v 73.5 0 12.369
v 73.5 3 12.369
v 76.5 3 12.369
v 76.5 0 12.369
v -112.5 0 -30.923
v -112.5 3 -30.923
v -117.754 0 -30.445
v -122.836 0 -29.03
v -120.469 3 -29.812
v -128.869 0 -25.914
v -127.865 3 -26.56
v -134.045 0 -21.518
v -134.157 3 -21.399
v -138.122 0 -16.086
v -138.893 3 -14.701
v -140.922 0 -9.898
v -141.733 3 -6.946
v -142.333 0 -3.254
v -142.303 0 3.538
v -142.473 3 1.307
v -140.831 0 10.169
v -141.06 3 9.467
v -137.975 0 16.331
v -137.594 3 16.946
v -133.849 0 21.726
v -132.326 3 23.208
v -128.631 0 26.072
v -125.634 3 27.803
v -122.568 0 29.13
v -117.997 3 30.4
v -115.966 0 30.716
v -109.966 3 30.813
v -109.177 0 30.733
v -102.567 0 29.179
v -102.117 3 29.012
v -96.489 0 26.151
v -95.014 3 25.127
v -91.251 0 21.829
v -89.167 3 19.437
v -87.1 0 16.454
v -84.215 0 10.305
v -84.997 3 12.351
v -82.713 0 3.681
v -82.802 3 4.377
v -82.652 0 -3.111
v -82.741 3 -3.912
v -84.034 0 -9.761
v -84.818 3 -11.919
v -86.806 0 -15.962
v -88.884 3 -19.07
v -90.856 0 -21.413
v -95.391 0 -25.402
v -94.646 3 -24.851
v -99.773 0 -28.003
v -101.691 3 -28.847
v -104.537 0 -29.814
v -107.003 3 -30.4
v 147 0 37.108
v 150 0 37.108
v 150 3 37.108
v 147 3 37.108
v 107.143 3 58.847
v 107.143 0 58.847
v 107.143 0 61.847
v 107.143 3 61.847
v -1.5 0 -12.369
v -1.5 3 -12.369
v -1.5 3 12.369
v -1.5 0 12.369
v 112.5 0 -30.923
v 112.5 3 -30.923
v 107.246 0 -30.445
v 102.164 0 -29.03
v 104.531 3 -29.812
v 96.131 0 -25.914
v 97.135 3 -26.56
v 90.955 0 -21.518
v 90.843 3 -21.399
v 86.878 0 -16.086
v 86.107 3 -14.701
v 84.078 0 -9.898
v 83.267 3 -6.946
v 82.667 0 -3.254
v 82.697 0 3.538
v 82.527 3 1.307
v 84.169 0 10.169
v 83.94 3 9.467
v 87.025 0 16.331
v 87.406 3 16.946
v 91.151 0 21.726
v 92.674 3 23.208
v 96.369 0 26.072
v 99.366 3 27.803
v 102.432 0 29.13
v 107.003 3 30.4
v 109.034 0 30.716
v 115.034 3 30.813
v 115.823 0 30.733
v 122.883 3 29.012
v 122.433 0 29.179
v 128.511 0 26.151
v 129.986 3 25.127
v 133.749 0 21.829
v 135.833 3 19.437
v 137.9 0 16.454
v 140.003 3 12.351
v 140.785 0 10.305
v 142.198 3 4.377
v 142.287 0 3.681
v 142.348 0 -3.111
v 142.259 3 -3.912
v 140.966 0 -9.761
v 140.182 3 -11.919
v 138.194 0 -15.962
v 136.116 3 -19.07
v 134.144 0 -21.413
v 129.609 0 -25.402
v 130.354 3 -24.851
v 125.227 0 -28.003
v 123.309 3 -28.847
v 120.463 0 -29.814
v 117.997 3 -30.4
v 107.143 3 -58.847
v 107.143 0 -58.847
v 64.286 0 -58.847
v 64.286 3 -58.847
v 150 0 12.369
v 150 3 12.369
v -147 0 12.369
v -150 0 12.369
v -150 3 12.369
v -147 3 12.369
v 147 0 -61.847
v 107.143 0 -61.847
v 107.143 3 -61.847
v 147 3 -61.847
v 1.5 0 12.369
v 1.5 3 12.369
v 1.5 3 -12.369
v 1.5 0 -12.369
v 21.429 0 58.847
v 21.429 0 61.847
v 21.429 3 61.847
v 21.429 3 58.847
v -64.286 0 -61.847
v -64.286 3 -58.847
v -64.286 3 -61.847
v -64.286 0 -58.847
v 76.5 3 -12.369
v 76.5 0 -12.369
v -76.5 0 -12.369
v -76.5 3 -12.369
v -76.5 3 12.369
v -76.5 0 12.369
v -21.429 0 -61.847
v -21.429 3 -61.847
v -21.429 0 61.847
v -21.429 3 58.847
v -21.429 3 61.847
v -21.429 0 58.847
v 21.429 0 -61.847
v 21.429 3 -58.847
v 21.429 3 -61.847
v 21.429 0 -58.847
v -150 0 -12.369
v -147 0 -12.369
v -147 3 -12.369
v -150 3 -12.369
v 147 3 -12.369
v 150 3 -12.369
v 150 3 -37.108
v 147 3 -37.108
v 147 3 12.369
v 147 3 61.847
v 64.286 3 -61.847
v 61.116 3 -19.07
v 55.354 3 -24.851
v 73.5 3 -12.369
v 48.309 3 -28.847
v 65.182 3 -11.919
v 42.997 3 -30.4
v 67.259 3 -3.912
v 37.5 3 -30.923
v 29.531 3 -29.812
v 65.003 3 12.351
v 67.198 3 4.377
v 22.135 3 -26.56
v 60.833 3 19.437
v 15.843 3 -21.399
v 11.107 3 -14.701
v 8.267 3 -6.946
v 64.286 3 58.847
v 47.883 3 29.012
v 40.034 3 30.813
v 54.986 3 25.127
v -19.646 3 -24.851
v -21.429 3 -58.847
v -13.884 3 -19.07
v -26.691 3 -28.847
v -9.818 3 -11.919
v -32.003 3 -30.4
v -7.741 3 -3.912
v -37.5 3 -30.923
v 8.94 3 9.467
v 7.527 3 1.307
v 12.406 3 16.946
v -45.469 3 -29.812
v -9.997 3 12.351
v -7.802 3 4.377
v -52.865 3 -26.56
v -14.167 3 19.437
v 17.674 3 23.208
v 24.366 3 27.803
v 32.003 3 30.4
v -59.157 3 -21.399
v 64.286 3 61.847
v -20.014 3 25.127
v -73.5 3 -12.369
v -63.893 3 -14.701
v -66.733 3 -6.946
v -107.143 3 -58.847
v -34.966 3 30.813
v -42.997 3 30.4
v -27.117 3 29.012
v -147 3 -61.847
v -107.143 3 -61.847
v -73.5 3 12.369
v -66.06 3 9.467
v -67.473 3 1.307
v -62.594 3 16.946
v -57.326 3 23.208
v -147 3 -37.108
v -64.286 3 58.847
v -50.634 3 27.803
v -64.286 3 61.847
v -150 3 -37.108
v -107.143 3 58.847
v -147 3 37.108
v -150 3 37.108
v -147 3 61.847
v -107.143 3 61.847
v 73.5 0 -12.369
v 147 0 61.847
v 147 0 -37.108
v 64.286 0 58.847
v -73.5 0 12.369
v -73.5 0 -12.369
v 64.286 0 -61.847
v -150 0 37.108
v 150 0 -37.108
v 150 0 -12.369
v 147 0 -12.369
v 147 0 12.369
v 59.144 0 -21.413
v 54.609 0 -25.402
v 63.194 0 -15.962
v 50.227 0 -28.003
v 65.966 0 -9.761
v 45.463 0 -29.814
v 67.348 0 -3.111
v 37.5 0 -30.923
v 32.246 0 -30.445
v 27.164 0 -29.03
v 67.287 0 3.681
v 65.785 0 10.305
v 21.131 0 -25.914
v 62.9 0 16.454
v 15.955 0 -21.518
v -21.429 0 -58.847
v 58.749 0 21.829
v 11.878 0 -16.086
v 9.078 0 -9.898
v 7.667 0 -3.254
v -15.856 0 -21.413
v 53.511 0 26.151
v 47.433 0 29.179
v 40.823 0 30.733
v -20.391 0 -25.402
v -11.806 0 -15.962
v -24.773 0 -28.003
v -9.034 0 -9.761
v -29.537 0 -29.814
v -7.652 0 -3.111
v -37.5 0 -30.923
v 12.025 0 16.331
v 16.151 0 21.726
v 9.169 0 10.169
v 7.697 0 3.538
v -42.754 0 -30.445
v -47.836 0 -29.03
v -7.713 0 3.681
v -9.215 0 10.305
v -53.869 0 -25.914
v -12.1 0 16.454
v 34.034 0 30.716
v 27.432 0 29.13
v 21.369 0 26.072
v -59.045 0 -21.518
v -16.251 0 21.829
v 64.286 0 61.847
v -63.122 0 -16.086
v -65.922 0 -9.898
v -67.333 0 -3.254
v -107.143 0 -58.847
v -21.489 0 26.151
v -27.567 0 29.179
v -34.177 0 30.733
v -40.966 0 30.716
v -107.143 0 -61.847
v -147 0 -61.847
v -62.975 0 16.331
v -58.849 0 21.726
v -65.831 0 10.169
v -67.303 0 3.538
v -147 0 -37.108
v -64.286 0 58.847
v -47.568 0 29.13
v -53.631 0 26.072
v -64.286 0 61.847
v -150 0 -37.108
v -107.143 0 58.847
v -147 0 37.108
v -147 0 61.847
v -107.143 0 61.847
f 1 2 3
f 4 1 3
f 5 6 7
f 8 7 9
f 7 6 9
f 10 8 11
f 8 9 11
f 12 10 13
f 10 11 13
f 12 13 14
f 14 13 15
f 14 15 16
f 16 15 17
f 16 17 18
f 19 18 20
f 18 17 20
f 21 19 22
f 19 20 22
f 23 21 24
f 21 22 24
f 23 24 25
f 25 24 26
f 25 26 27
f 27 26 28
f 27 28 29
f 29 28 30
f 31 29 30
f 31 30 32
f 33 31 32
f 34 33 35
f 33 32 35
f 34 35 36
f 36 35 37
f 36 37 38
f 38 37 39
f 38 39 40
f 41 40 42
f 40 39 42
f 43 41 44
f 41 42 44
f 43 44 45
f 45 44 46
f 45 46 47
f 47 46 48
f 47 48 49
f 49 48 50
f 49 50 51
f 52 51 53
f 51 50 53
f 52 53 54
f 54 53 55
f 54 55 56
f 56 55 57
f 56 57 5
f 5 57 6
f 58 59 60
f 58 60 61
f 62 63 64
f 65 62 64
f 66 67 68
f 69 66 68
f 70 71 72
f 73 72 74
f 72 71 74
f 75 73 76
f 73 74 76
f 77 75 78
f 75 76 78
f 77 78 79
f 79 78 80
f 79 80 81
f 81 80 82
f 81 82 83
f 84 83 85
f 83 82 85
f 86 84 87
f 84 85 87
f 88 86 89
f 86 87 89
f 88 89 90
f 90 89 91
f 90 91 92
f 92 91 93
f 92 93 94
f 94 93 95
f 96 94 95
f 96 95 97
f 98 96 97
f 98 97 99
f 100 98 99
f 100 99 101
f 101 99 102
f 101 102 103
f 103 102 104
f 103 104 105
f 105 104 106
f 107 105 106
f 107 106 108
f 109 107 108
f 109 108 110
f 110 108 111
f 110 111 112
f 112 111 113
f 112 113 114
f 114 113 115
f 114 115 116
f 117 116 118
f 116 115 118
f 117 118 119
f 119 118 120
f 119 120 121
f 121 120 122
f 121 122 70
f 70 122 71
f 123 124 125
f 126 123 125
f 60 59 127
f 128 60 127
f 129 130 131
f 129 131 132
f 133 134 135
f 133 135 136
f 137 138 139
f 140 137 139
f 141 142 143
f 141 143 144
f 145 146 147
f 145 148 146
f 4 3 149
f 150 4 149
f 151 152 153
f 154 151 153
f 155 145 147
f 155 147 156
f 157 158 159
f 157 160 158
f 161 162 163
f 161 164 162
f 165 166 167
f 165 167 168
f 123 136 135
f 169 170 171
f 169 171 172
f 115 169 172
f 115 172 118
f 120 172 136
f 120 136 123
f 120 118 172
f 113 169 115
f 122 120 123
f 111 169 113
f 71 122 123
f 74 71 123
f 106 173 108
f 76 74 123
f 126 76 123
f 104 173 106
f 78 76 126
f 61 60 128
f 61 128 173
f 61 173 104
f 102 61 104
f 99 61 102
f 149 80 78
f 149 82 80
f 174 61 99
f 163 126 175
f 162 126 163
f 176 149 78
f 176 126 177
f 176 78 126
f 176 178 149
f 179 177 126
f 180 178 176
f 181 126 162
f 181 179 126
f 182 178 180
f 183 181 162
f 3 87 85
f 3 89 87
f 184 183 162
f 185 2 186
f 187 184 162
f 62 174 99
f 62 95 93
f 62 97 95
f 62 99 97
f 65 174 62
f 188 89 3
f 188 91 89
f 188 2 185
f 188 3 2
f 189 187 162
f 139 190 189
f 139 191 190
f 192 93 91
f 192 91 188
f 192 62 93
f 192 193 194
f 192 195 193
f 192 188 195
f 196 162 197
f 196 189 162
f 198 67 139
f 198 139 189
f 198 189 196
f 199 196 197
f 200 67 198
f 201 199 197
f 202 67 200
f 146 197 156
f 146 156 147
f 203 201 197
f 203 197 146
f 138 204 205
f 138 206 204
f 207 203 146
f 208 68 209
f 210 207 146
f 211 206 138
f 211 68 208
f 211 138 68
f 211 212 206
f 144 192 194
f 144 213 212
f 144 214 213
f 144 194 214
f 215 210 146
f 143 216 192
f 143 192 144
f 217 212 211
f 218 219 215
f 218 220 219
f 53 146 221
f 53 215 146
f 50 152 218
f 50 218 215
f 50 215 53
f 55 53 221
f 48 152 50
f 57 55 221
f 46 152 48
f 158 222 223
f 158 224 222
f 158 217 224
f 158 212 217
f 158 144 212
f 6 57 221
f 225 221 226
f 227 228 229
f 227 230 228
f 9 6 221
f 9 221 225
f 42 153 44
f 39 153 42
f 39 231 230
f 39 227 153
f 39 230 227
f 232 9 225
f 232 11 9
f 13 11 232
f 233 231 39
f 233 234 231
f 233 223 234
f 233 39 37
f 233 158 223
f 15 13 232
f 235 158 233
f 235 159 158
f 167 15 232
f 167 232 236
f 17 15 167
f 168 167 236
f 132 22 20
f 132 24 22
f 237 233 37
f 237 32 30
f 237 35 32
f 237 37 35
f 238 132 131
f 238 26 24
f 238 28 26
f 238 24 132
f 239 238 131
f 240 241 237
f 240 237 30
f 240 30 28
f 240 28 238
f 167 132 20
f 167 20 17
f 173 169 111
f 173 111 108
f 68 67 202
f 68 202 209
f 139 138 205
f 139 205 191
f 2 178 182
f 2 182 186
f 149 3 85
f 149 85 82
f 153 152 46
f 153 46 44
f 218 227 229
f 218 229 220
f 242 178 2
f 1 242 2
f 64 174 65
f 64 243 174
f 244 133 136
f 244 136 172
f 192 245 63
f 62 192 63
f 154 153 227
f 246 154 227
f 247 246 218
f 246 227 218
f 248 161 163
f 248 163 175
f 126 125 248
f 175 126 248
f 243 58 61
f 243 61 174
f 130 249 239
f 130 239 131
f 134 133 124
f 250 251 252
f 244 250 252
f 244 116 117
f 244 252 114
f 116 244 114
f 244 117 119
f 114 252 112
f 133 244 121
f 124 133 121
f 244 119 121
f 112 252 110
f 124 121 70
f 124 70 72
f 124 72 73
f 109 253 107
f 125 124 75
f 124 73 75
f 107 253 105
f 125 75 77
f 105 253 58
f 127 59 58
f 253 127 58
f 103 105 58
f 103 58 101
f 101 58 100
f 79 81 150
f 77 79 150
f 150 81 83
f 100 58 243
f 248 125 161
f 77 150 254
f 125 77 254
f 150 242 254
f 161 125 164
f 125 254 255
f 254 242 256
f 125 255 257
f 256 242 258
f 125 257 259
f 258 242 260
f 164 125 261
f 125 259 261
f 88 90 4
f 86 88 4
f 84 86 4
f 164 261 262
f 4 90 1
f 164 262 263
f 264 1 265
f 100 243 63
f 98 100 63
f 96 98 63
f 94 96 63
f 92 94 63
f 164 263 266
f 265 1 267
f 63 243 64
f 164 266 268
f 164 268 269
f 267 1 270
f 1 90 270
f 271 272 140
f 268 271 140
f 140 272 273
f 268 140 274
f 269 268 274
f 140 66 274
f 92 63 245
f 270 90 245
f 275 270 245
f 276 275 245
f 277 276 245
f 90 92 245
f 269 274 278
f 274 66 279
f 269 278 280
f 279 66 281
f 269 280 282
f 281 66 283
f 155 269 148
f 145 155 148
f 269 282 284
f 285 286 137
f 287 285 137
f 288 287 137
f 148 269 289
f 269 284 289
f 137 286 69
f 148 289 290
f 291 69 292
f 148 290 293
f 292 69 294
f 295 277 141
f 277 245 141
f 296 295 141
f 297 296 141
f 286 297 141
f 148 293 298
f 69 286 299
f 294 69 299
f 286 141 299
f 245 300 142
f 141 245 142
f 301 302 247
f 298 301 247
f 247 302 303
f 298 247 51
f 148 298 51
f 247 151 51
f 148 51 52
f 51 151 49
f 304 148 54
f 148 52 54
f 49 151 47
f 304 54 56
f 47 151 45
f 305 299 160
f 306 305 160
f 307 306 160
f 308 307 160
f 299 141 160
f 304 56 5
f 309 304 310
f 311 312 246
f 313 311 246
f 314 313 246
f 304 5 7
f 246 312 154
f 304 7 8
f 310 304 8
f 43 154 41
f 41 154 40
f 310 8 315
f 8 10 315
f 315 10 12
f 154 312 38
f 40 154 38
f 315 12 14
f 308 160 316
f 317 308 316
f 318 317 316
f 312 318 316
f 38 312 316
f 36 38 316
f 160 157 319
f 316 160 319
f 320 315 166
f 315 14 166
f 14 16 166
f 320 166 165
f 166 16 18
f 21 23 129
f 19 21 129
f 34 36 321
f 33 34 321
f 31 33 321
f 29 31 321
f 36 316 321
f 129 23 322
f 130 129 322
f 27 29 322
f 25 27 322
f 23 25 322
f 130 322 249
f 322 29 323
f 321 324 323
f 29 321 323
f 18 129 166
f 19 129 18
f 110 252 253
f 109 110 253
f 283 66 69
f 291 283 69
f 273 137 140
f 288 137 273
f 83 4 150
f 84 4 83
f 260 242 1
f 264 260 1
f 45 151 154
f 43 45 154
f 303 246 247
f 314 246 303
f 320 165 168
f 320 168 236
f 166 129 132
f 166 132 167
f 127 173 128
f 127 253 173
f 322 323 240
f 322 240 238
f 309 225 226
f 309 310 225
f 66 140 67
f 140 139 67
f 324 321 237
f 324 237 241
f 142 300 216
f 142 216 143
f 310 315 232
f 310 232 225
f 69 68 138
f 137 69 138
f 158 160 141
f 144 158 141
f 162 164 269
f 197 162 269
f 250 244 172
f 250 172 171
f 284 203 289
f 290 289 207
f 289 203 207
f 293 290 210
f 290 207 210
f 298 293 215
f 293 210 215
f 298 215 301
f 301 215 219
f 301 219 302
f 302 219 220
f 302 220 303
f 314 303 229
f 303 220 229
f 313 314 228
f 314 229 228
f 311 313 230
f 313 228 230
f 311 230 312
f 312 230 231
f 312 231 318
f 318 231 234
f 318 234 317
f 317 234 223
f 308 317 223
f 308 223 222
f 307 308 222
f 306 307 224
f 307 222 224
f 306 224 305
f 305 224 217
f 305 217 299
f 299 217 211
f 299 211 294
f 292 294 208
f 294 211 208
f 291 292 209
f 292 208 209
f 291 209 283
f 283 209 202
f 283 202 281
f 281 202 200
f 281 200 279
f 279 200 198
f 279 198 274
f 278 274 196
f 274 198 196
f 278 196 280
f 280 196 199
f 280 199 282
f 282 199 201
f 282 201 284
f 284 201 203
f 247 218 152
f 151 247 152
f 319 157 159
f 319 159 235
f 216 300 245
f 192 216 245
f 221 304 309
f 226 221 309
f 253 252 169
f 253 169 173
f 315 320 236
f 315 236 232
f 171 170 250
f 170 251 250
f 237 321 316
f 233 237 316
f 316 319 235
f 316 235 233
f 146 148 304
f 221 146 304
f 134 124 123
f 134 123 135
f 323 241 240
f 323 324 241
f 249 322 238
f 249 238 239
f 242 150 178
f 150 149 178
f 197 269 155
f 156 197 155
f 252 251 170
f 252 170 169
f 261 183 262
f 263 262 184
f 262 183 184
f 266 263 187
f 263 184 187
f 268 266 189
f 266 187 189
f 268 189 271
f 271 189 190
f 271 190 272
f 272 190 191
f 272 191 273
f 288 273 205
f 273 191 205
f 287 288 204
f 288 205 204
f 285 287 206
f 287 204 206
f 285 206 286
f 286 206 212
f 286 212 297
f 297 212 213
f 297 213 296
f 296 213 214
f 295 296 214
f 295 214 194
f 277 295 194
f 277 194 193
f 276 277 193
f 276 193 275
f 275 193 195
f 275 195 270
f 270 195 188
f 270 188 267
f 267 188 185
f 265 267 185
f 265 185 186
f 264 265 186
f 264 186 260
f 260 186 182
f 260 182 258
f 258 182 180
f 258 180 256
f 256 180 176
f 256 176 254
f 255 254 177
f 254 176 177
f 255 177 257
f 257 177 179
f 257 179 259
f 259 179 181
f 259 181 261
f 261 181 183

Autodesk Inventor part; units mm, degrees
ref_plane "YZ Plane" through (0, 0, 0) normal (1, 0, 0) x (0, 1, 0)
ref_plane "XZ Plane" through (0, 0, 0) normal (0, 1, 0) x (-1, 0, 0)
ref_plane "XY Plane" through (0, 0, 0) normal (0, 0, 1) x (1, 0, 0)
sketch "Sketch1" plane through (0, 0, 0) normal (0, 1, 0) x (-1, 0, 0)
  line L0 (107.1429, 58.8466) -> (107.1429, 61.8466)
  line L1 (64.2857, 61.8466) -> (64.2857, 58.8466)
  line L2 (21.4286, 58.8466) -> (21.4286, 61.8466)
  line L3 (-21.4286, 61.8466) -> (-21.4286, 58.8466)
  line L4 (-64.2857, 61.8466) -> (-64.2857, 58.8466)
  line L5 (-107.1429, 58.8466) -> (-107.1429, 61.8466)
  line L6 (107.1429, -58.8466) -> (107.1429, -61.8466)
  line L7 (64.2857, -58.8466) -> (64.2857, -61.8466)
  line L8 (21.4286, -58.8466) -> (21.4286, -61.8466)
  line L9 (-21.4286, -58.8466) -> (-21.4286, -61.8466)
  line L10 (-64.2857, -58.8466) -> (-64.2857, -61.8466)
  line L11 (-107.1429, -58.8466) -> (-107.1429, -61.8466)
  line L12 (107.1429, 61.8466) -> (147, 61.8466)
  line L13 (107.1429, 58.8466) -> (64.2857, 58.8466)
  line L14 (147, -61.8466) -> (107.1429, -61.8466)
  line L15 (64.2857, -61.8466) -> (21.4286, -61.8466)
  line L16 (-21.4286, -61.8466) -> (-64.2857, -61.8466)
  line L17 (-107.1429, -61.8466) -> (-147, -61.8466)
  line L18 (64.2857, -58.8466) -> (107.1429, -58.8466)
  line L19 (-107.1429, -58.8466) -> (-64.2857, -58.8466)
  line L20 (-21.4286, -58.8466) -> (21.4286, -58.8466)
  line L21 (21.4286, 61.8466) -> (64.2857, 61.8466)
  line L22 (21.4286, 58.8466) -> (-21.4286, 58.8466)
  line L23 (-64.2857, 58.8466) -> (-107.1429, 58.8466)
  line L24 (-147, 61.8466) -> (-107.1429, 61.8466)
  line L25 (-64.2857, 61.8466) -> (-21.4286, 61.8466)
  line L26 (147, 37.108) -> (150, 37.108)
  line L27 (150, 12.3693) -> (147, 12.3693)
  line L28 (147, -12.3693) -> (150, -12.3693)
  line L29 (150, -37.108) -> (147, -37.108)
  line L30 (147, -37.108) -> (147, -61.8466)
  line L31 (150, 37.108) -> (150, 12.3693)
  line L32 (150, -12.3693) -> (150, -37.108)
  line L33 (147, 61.8466) -> (147, 37.108)
  line L34 (147, 12.3693) -> (147, -12.3693)
  line L35 (-147, -37.108) -> (-150, -37.108)
  line L36 (-150, -12.3693) -> (-147, -12.3693)
  line L37 (-147, 12.3693) -> (-150, 12.3693)
  line L38 (-150, 37.108) -> (-147, 37.108)
  line L39 (-150, 37.108) -> (-150, 12.3693)
  line L40 (-150, -12.3693) -> (-150, -37.108)
  line L41 (-147, 37.108) -> (-147, 61.8466)
  line L42 (-147, -61.8466) -> (-147, -37.108)
  line L43 (-147, -12.3693) -> (-147, 12.3693)
  point P0 (0, 0)
  dimension "d23" = 123.6932
  dimension "d35" = 3
  dimension "d36" = 61.8466
  dimension "d37" = 3
  dimension "d41" = 24.7386
  dimension "d42" = 49.4773
  dimension "d43" = 74.2159
  dimension "d44" = 98.9545
  dimension "d45" = 3
  dimension "d46" = 42.8571
  dimension "d47" = 128.5714
  dimension "d48" = 171.4286
  dimension "d49" = 214.2857
  dimension "d50" = 85.7143
  dimension "d51" = 257.1429
  dimension "d52" = 300
  dimension "d53" = 3
  dimension "d54" = 150
extrude "Extrusion1" add sketch "Sketch1" along normal blind 3
sketch "Sketch2" plane through (0, 3, 0) normal (0, 1, 0) x (1, 0, 0)
  ellipse E0 centre (-112.5, 0) end of major axis (-112.5, 30.9233) minor radius 30
  point P0 (0, 0)
  point P1 (-82.5, 0)
  point P2 (-112.5, -30.9233)
  dimension "d55" = 112.5
  dimension "d56" = 30
  dimension "d57" = 30.9233
extrude "Extrusion2" cut sketch "Sketch2" against normal through all
pattern_linear "Rectangular Pattern1" count 4 spacing 75 along (1, 0, 0) of "Extrusion2"
sketch "Sketch3" plane through (0, 3, 0) normal (0, 1, 0) x (1, 0, 0)
  line L0 (-76.5, -12.3693) -> (-73.5, -12.3693)
  line L1 (-73.5, -12.3693) -> (-73.5, 12.3693)
  line L2 (-73.5, 12.3693) -> (-76.5, 12.3693)
  line L3 (-76.5, 12.3693) -> (-76.5, -12.3693)
  point P0 (0, 0)
  dimension "d92" = 24.7386
  dimension "d93" = 73.5
  dimension "d94" = 3
  dimension "d95" = 12.3693
extrude "Extrusion3" cut sketch "Sketch3" against normal through all
pattern_linear "Rectangular Pattern2" count 3 spacing 75 along (1, 0, 0) of "Extrusion3"
equation "\"d23\" = dt"
equation "\"d35\" = tt"
equation "\"d36\" = 0.5 * dt"
equation "\"d37\" = tt"
equation "\"d41\" = 0.2 * dt - tol"
equation "\"d42\" = 0.4 * dt + tol"
equation "\"d43\" = 0.6 * dt - tol"
equation "\"d44\" = 0.8 * dt + tol"
equation "\"d45\" = tt"
equation "\"d46\" = 0.142857 * wt + tol"
equation "\"d47\" = 0.428571 * wt + tol"
equation "\"d48\" = 0.571429 * wt - tol"
equation "\"d49\" = 0.714286 * wt + tol"
equation "\"d50\" = 0.285714 * wt - tol"
equation "\"d51\" = 0.857143 * wt - tol"
equation "\"d52\" = wt"
equation "\"d53\" = tt"
equation "\"d54\" = 0.5 * wt"
equation "\"d31\" = tt"
equation "\"d56\" = 0.5 * glassDia"
equation "\"d92\" = 0.2 * dt + 2 * tol"
equation "\"d93\" = 0.25 * wt - 0.5 * tt"
equation "\"d94\" = tt"
equation "\"d95\" = 0.1 * dt + tol"
equation "\"d100\" = 0.25 * wt"
equation "\"d0\" = 0.5 * dt"
equation "\"d1\" = 0.5 * dt"
equation "\"d4\" = tt"
equation "\"wt\" = 300"
equation "\"tt\" = 3"
equation "\"tol\" = 0"
equation "\"tiroir\" = 1"
equation "\"d39\" = tt"
equation "\"d40\" = tt"
equation "\"nHoles\" = 4"
equation "\"shelfH\" = 35"
equation "\"dt\" = 123.693169"
equation "\"glassDia\" = 60"
properties part number "base"
